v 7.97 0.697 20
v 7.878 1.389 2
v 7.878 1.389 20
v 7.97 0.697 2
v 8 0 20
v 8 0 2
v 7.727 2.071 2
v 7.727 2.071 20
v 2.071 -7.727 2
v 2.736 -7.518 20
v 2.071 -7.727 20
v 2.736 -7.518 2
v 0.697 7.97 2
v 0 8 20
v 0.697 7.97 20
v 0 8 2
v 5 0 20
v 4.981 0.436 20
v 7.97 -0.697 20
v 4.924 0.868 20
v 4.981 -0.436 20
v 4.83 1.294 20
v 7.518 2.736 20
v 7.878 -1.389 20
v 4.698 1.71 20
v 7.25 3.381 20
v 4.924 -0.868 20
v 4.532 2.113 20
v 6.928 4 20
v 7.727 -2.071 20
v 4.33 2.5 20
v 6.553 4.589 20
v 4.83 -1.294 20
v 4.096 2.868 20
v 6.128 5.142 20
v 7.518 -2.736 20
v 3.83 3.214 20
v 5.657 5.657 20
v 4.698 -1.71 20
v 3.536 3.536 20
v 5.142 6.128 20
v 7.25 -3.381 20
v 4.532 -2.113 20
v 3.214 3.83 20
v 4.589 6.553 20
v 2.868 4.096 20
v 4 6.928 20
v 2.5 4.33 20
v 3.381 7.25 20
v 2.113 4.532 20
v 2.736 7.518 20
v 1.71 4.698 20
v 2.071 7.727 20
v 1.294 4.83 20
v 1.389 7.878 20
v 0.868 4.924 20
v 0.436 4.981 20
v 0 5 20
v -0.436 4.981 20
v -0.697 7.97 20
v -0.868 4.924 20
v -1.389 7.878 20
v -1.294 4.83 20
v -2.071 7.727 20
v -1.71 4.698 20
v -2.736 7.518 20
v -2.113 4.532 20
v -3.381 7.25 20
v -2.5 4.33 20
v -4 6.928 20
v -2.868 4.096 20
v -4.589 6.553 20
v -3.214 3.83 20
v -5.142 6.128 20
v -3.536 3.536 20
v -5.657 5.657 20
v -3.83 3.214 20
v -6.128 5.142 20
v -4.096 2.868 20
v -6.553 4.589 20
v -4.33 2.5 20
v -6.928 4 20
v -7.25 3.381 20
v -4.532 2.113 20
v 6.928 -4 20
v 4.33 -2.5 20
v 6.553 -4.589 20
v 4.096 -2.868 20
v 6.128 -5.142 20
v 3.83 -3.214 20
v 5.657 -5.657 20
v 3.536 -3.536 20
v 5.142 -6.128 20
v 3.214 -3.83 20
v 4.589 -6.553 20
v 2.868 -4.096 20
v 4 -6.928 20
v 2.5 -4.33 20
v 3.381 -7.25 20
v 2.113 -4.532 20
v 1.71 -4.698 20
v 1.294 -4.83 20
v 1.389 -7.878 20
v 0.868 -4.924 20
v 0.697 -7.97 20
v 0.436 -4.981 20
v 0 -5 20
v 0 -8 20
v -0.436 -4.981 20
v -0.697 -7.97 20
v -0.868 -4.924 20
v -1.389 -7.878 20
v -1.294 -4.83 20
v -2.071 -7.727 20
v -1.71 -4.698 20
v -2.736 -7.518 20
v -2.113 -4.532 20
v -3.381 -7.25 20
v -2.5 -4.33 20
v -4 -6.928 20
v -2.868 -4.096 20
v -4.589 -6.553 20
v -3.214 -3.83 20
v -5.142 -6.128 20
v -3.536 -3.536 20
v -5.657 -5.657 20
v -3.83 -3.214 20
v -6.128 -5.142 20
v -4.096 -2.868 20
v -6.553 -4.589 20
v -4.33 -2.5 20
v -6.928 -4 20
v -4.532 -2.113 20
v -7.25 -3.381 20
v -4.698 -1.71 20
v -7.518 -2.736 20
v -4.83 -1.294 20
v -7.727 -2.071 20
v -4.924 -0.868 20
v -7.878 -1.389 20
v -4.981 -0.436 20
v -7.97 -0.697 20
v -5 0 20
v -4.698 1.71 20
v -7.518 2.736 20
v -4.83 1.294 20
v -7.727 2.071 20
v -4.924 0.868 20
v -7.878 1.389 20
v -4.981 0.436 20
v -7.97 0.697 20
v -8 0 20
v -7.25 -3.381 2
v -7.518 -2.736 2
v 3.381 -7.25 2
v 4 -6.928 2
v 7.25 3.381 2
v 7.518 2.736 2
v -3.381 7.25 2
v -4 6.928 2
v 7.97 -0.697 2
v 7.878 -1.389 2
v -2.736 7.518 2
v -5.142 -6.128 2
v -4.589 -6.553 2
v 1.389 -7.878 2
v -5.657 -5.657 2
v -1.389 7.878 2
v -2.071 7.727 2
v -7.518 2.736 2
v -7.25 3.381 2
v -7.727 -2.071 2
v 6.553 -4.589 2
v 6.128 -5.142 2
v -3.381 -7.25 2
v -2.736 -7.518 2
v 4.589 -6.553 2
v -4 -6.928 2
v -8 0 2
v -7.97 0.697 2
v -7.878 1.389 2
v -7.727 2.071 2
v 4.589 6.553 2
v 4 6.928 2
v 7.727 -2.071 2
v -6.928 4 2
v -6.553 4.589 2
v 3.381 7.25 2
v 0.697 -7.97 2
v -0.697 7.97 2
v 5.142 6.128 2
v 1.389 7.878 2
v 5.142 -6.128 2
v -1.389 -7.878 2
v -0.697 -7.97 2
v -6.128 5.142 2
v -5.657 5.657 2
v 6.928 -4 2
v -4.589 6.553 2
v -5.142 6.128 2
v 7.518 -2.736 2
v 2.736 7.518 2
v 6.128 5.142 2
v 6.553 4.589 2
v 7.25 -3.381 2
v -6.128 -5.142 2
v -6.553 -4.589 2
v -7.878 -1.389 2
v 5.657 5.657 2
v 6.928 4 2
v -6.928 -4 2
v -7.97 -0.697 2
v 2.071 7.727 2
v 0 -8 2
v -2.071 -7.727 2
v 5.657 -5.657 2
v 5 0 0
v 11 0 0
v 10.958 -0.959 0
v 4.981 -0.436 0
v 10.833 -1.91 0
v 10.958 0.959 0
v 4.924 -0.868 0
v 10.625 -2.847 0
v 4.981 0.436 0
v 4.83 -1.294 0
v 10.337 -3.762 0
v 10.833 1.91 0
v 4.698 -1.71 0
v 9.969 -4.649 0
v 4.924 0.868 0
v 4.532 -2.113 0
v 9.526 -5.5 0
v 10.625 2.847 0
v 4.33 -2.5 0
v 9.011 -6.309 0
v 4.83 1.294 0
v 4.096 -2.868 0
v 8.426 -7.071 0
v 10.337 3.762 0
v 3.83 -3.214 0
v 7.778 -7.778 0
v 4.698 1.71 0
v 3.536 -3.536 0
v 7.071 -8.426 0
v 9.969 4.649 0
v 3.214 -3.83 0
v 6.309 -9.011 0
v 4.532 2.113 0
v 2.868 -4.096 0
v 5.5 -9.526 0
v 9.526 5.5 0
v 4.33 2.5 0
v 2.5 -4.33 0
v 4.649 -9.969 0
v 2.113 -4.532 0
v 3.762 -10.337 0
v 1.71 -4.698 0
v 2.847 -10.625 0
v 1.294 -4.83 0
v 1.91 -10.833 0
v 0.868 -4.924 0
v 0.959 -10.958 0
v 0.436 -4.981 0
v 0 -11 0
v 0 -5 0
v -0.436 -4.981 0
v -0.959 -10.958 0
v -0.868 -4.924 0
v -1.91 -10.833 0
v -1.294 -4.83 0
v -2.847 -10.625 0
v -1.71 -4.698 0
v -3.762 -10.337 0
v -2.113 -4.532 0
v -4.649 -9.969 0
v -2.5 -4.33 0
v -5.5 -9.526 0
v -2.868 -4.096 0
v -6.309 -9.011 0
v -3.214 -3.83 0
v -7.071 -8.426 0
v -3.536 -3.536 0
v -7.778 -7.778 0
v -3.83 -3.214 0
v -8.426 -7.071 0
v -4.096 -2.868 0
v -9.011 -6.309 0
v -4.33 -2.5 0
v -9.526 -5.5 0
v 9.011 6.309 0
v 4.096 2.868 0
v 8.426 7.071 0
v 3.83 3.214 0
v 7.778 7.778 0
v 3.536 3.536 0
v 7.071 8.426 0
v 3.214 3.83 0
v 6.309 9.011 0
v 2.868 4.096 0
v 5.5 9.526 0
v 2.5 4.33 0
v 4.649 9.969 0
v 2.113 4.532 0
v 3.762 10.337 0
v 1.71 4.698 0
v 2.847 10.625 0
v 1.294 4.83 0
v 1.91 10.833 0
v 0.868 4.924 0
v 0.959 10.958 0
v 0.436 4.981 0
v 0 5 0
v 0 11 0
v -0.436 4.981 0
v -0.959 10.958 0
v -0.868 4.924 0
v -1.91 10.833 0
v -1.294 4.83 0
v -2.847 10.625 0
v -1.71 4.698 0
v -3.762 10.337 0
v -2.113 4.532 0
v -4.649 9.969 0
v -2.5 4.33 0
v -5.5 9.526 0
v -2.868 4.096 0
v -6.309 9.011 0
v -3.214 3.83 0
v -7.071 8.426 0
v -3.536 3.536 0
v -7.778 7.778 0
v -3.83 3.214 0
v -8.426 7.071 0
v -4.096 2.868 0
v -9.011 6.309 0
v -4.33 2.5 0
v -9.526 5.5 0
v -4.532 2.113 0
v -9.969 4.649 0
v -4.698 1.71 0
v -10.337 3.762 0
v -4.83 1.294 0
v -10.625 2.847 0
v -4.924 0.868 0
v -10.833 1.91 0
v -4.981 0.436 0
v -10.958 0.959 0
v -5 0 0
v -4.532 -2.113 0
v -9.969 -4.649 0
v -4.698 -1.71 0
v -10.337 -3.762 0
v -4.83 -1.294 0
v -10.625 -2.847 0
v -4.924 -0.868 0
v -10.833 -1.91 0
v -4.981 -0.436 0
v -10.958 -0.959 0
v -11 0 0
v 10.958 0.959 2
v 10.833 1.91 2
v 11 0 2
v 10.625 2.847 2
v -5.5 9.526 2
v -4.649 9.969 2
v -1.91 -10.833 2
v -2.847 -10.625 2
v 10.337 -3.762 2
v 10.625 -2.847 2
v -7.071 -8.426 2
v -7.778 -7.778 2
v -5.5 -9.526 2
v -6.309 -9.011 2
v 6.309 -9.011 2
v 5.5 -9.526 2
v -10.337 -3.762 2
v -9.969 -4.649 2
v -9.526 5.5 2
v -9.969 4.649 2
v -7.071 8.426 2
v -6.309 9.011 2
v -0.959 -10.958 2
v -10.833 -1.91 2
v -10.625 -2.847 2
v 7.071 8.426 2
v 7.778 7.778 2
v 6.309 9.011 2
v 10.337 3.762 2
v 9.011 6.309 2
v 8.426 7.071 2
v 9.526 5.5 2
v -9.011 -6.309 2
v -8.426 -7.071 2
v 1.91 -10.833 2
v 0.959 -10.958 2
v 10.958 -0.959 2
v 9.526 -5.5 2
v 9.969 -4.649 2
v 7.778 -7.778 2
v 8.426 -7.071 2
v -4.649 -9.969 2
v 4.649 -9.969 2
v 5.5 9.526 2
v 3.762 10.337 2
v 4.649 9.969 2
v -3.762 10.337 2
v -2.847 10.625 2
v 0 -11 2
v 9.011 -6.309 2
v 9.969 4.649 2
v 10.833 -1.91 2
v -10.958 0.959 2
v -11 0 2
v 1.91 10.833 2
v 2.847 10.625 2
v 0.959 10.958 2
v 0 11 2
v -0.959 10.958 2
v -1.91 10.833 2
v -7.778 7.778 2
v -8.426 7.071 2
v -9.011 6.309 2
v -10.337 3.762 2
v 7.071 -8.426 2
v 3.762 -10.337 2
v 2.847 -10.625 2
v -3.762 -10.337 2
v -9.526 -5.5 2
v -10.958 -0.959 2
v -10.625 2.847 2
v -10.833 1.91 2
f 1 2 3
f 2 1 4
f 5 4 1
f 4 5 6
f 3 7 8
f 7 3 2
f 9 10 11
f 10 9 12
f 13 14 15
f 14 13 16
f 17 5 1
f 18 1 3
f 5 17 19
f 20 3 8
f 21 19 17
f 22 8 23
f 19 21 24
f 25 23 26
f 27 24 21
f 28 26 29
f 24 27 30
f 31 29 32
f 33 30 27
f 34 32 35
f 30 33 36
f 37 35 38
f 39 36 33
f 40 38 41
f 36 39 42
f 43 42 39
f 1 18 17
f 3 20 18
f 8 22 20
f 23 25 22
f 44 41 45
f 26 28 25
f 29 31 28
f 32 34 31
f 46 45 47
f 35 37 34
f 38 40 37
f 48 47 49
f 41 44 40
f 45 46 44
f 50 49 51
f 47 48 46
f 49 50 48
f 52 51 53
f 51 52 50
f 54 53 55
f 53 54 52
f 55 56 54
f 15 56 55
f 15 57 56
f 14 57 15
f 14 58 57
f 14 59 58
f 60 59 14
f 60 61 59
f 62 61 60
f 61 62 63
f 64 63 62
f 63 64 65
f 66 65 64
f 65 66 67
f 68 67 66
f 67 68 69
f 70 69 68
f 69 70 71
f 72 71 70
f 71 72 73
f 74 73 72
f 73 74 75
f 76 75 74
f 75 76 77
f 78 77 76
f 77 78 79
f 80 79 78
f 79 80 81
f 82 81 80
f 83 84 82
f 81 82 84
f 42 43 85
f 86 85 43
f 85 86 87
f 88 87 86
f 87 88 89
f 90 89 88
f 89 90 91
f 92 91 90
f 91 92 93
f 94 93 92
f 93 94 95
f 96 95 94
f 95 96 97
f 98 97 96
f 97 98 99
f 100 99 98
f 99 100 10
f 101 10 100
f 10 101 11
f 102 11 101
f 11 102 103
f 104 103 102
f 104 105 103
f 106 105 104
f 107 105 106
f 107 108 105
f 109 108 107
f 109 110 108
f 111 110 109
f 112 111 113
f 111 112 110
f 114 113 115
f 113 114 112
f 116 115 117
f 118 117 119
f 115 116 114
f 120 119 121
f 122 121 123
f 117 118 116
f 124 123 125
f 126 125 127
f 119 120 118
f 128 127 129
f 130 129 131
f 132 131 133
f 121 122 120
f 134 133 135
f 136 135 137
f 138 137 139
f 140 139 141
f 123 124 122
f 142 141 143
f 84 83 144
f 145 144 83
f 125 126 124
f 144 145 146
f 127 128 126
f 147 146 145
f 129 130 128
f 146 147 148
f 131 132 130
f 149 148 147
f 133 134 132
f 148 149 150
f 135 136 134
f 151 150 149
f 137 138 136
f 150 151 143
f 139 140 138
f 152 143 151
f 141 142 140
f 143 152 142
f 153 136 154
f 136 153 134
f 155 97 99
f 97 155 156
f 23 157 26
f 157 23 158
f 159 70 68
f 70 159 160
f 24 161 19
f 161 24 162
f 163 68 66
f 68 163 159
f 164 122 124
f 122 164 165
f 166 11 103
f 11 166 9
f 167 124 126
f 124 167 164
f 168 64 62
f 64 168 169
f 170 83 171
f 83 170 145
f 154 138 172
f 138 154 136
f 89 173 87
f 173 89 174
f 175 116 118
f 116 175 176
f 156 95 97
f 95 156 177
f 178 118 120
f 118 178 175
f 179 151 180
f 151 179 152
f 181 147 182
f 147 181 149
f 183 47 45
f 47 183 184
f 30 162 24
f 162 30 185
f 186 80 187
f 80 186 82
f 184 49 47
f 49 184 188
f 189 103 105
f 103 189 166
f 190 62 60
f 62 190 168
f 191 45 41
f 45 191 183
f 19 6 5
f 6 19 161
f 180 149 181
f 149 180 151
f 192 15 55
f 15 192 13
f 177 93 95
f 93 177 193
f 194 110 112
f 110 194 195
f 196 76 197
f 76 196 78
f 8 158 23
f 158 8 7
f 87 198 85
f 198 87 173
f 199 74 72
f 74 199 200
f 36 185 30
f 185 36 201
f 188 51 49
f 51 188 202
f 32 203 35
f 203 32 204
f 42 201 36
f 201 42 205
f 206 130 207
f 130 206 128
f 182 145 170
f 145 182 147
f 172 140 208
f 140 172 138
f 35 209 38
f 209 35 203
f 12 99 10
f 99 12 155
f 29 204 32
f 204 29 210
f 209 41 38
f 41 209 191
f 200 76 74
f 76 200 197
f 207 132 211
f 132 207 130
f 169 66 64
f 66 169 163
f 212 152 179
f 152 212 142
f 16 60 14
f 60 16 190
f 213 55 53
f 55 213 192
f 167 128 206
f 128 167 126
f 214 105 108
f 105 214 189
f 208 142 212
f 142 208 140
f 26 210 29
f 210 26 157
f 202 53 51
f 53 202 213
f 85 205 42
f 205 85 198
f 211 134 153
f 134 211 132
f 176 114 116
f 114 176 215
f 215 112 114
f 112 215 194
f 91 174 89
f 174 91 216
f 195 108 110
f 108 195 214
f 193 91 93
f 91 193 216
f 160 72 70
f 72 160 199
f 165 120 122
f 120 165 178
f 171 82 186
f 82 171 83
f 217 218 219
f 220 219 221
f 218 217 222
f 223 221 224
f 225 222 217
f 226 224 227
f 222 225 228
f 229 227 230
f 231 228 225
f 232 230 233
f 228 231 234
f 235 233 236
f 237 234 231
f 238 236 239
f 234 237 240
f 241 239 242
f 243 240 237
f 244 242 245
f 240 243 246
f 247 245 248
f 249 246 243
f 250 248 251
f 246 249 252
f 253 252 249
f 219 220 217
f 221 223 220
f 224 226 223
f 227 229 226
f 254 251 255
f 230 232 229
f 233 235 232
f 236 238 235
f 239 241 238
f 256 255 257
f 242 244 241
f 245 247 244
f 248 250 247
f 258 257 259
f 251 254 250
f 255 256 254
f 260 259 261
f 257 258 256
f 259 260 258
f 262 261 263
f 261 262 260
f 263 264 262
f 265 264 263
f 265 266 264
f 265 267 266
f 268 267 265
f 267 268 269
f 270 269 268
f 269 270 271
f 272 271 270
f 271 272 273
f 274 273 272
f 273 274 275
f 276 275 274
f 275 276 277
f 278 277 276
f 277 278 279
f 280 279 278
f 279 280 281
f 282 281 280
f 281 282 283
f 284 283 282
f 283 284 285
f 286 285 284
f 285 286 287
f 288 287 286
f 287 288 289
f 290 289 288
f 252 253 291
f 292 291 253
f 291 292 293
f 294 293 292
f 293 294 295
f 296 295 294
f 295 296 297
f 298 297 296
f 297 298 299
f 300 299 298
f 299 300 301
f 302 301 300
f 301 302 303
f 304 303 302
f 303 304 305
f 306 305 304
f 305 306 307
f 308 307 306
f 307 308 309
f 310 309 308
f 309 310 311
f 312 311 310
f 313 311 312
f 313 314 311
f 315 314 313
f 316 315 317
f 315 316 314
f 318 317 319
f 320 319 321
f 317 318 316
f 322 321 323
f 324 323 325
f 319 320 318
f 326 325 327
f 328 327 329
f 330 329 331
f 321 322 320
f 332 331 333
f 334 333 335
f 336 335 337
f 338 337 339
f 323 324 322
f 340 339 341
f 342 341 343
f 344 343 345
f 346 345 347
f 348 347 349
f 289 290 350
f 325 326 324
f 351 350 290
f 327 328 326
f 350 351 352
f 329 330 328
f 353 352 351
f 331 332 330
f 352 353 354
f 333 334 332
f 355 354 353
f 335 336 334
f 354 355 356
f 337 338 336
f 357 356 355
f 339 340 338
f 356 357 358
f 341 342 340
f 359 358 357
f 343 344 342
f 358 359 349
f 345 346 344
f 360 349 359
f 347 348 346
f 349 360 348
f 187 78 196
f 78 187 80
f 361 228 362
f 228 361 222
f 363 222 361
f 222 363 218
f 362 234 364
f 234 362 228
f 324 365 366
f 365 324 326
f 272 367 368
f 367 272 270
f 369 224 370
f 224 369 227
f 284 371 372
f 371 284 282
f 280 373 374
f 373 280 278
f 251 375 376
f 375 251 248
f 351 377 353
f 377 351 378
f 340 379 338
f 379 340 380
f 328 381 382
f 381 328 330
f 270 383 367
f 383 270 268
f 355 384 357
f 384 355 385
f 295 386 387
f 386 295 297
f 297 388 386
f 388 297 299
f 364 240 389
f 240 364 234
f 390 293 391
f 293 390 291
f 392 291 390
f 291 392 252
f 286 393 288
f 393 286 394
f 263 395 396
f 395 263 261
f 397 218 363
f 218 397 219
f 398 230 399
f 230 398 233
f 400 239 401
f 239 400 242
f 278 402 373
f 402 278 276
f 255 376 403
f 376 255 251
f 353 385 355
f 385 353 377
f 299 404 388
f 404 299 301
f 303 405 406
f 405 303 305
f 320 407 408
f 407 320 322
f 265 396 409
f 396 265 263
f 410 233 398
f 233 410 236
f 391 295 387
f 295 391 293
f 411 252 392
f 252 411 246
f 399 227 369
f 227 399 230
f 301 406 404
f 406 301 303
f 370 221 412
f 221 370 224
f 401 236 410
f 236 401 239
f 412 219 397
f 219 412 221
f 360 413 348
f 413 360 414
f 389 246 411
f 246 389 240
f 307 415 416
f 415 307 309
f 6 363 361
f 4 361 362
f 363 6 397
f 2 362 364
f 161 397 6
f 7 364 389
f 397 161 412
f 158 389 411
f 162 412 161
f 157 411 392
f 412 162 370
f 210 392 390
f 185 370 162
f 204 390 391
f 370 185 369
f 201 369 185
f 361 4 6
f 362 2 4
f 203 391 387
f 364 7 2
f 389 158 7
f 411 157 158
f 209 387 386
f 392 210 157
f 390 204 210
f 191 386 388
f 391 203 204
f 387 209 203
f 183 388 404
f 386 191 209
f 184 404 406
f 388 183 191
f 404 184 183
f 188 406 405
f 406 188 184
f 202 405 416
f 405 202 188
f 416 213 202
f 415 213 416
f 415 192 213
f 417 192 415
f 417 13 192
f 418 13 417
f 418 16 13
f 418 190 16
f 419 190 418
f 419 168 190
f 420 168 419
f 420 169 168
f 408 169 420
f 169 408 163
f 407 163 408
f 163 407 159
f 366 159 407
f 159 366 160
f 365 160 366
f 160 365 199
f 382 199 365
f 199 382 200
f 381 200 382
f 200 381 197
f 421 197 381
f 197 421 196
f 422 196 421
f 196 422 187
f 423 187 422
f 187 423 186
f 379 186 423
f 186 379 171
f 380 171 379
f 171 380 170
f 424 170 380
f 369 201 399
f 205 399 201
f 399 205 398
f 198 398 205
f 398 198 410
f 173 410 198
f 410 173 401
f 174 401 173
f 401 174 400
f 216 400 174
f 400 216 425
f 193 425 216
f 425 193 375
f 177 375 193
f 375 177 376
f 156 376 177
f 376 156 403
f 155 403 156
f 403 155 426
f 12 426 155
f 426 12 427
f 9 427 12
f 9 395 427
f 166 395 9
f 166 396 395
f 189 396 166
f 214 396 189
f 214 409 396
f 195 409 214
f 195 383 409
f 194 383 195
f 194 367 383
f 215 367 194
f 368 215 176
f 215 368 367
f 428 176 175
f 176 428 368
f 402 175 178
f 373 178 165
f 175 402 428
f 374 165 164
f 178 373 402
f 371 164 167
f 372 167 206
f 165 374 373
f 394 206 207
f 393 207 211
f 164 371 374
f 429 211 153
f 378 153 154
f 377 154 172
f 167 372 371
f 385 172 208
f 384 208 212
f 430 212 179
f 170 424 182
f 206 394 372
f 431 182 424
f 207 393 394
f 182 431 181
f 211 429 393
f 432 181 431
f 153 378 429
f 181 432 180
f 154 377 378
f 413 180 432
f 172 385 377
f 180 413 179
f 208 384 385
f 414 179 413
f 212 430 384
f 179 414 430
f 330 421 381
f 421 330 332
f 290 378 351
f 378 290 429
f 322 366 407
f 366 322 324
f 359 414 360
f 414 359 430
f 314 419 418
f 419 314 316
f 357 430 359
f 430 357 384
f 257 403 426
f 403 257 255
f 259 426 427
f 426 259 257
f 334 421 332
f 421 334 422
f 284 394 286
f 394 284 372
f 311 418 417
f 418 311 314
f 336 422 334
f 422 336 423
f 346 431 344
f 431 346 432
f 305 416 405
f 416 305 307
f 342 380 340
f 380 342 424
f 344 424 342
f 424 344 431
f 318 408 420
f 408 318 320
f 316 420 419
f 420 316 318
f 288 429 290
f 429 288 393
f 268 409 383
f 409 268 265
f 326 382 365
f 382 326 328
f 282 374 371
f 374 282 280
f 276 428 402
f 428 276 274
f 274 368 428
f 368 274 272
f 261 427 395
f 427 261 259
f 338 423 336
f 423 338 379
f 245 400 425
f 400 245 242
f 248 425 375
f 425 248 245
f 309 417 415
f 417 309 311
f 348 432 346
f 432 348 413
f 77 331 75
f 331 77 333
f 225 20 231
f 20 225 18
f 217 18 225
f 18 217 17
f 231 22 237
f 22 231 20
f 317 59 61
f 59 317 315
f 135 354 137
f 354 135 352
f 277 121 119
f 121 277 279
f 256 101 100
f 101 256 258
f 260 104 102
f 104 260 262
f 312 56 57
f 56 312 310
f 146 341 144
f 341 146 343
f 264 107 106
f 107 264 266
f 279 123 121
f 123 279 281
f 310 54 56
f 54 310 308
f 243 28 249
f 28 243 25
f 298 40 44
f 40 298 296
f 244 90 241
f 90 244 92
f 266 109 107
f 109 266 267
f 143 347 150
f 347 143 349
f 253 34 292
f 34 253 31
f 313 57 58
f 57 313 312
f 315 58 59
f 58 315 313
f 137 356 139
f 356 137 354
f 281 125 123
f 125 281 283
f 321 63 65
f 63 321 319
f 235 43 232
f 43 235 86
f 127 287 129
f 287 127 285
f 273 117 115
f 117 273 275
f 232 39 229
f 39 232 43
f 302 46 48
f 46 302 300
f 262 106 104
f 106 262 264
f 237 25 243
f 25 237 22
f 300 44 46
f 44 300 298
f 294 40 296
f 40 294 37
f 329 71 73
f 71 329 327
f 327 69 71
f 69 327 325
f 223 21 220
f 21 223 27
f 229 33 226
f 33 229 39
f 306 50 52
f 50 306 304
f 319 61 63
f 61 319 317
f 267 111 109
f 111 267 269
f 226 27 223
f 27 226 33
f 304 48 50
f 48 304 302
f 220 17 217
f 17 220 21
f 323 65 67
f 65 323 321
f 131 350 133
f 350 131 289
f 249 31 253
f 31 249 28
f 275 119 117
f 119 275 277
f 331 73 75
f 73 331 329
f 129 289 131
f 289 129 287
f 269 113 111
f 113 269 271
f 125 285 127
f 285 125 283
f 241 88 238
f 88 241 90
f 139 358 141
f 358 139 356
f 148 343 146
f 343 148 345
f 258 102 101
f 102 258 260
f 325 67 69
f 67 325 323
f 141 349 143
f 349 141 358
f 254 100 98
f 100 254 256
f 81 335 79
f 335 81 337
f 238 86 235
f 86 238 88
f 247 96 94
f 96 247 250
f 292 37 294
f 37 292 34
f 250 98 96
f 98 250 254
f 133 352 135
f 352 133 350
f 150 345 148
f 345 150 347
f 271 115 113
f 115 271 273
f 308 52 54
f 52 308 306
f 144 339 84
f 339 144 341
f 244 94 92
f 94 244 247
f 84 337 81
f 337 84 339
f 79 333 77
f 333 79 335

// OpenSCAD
// Flanged sleeve bushing / plain bearing - a sleeve with a flange at one end that seats in a
// bore. NOVEL general mechanical part.
//
// @desc flanged sleeve bushing / plain bearing
// @prompt Design a flanged sleeve bushing in OpenSCAD: a sleeve {length} mm long with a {od} mm outer diameter and a {bore} mm bore, with a flange {flange} mm wider at one end. Reply with a single complete OpenSCAD file.
// @param od     sleeve outer diameter, mm   [8:40]
// @param bore   bore diameter, mm           [3:30]
// @param length sleeve length, mm           [6:40]
// @param flange flange overhang, mm         [1.5:6]

od     = 16;
bore   = 10;
length = 20;
flange = 3;

$fn = 72;

flange_t = 2;

difference() {
    union() {
        cylinder(h = length, d = od);
        cylinder(h = flange_t, d = od + 2 * flange);
    }
    translate([0, 0, -1]) cylinder(h = length + 2, d = bore);
}
